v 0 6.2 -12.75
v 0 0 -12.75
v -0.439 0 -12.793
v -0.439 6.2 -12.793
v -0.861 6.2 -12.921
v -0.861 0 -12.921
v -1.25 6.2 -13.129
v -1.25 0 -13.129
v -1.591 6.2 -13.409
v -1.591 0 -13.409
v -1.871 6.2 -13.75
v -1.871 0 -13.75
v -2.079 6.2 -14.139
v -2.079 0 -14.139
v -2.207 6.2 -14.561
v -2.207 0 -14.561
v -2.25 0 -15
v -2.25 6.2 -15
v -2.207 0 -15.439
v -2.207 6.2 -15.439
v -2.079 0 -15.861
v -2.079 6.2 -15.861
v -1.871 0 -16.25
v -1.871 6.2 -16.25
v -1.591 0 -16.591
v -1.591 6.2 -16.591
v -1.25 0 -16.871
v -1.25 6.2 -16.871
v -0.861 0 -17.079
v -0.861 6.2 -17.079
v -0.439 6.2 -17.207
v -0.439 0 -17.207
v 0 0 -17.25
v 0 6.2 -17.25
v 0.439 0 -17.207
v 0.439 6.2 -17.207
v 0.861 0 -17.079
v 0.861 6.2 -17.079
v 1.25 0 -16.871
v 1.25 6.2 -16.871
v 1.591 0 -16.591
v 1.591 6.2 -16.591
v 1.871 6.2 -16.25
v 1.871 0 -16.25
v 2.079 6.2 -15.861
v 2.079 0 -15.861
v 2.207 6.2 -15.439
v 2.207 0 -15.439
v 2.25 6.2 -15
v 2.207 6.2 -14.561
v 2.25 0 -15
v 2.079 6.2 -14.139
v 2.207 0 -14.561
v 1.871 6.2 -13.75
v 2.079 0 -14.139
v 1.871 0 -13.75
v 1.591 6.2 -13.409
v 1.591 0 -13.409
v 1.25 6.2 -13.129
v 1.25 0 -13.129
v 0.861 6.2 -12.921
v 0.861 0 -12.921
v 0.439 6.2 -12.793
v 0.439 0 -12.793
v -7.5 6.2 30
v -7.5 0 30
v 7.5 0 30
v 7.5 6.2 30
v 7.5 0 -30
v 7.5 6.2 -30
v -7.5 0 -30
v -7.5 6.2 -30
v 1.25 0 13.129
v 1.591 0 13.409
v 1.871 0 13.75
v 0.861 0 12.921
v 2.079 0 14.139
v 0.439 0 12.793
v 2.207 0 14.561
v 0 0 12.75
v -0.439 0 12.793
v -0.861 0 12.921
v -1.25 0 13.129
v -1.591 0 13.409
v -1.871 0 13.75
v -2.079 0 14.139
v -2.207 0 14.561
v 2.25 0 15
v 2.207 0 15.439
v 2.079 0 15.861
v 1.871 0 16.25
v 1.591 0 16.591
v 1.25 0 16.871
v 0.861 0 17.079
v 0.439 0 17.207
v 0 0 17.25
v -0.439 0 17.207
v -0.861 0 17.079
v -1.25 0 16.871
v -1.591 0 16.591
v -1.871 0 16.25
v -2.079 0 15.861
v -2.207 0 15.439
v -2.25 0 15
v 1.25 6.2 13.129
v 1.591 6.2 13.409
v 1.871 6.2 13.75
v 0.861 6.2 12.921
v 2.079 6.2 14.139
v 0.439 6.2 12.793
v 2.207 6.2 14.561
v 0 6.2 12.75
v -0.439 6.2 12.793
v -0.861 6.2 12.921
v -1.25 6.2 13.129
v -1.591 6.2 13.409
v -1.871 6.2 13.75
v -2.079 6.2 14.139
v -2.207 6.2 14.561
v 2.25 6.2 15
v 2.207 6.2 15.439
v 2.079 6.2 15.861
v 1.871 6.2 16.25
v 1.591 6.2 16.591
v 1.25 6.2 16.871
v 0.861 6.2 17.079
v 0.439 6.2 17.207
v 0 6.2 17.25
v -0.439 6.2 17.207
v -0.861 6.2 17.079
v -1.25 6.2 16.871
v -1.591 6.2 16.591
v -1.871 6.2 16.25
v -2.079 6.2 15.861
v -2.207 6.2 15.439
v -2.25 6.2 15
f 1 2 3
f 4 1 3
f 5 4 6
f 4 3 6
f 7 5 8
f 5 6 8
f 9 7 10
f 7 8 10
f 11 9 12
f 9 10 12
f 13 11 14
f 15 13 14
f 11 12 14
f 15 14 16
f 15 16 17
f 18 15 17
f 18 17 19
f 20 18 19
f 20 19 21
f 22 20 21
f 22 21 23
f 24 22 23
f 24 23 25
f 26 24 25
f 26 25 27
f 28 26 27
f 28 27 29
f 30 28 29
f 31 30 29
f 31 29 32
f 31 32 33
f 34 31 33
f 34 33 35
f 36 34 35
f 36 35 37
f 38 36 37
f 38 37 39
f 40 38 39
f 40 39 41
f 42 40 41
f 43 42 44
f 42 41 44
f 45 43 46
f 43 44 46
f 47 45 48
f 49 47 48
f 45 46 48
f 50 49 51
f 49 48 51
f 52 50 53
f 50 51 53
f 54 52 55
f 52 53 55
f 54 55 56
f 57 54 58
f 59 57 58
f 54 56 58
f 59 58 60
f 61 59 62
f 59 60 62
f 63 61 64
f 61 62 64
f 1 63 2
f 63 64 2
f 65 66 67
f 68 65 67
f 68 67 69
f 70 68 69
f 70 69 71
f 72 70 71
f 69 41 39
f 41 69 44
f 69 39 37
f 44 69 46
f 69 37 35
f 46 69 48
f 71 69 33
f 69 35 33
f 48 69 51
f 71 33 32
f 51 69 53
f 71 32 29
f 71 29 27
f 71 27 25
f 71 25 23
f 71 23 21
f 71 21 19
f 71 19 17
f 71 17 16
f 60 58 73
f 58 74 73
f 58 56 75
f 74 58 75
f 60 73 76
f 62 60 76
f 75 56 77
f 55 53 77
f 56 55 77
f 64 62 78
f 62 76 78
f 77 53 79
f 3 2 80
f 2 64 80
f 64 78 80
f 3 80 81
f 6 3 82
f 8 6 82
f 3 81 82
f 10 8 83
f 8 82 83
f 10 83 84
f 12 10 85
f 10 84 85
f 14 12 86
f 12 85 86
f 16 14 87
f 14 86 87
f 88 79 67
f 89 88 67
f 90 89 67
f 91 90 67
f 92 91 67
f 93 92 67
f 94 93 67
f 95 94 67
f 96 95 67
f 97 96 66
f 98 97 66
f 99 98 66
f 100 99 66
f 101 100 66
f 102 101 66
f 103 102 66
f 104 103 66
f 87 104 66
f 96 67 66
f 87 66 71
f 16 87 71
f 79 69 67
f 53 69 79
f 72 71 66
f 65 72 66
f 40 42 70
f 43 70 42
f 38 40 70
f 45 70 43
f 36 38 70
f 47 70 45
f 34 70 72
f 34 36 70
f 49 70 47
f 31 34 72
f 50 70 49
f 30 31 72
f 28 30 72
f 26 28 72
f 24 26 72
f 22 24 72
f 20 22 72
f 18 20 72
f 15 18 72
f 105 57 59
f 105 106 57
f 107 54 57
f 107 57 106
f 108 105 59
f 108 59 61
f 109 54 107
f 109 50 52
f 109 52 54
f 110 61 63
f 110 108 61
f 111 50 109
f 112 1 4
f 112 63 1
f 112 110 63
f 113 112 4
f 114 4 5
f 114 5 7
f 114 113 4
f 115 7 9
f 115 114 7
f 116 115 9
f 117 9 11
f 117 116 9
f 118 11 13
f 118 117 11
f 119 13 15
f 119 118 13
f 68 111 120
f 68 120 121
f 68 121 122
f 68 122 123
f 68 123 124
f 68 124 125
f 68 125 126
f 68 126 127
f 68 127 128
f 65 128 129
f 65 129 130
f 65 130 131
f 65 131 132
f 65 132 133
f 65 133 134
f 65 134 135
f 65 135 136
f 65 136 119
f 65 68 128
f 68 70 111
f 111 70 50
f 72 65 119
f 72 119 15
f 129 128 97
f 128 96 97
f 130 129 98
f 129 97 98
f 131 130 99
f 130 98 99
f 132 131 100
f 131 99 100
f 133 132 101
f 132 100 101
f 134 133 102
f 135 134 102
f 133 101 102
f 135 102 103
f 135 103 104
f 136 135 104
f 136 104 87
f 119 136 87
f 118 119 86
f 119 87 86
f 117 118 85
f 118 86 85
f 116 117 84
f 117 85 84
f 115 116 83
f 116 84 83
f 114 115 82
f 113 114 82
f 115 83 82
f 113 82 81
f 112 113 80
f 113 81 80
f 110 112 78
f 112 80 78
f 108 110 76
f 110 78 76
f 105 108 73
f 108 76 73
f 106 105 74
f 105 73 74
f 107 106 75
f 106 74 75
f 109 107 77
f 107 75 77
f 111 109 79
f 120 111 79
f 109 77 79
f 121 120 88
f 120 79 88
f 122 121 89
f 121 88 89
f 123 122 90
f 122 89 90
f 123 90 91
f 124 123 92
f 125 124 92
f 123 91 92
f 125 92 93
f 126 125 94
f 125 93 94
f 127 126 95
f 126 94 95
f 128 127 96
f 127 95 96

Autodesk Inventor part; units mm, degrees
ref_plane "YZ Plane" through (0, 0, 0) normal (1, 0, 0) x (0, 1, 0)
ref_plane "XZ Plane" through (0, 0, 0) normal (0, 1, 0) x (-1, 0, 0)
ref_plane "XY Plane" through (0, 0, 0) normal (0, 0, 1) x (1, 0, 0)
sketch "Sketch1" plane through (0, 0, 0) normal (0, 1, 0) x (-1, 0, 0)
  line L0 (-7.5, -30) -> (7.5, -30)
  line L1 (7.5, -30) -> (7.5, 30)
  line L2 (7.5, 30) -> (-7.5, 30)
  line L3 (-7.5, 30) -> (-7.5, -30)
  line L4 (-7.5, -30) -> (7.5, 30) construction
  line L5 (7.5, -30) -> (-7.5, 30) construction
  point P0 (0, 0)
  dimension "d0" = 15
  dimension "d1" = 60
extrude "Extrusion1" add sketch "Sketch1" along normal blind 6.2
sketch "Sketch2" plane through (0, 6.2, 0) normal (0, 1, 0) x (1, 0, 0)
  line L0 (-7.5, -30) -> (7.5, -30) projected
  line L1 (7.5, 30) -> (-7.5, 30) projected
  point P0 (0, 0)
  point P1 (0, -15)
  point P2 (0, 15)
  point P3 (0, -30)
  dimension "d4" = 15
  dimension "d5" = 15
hole "Hole1" at (0, 6.2, 15) at (0, 6.2, -15) direction (0, -1, 0) diameter 4.5 end through all
properties part number "Ajuste vertical"
